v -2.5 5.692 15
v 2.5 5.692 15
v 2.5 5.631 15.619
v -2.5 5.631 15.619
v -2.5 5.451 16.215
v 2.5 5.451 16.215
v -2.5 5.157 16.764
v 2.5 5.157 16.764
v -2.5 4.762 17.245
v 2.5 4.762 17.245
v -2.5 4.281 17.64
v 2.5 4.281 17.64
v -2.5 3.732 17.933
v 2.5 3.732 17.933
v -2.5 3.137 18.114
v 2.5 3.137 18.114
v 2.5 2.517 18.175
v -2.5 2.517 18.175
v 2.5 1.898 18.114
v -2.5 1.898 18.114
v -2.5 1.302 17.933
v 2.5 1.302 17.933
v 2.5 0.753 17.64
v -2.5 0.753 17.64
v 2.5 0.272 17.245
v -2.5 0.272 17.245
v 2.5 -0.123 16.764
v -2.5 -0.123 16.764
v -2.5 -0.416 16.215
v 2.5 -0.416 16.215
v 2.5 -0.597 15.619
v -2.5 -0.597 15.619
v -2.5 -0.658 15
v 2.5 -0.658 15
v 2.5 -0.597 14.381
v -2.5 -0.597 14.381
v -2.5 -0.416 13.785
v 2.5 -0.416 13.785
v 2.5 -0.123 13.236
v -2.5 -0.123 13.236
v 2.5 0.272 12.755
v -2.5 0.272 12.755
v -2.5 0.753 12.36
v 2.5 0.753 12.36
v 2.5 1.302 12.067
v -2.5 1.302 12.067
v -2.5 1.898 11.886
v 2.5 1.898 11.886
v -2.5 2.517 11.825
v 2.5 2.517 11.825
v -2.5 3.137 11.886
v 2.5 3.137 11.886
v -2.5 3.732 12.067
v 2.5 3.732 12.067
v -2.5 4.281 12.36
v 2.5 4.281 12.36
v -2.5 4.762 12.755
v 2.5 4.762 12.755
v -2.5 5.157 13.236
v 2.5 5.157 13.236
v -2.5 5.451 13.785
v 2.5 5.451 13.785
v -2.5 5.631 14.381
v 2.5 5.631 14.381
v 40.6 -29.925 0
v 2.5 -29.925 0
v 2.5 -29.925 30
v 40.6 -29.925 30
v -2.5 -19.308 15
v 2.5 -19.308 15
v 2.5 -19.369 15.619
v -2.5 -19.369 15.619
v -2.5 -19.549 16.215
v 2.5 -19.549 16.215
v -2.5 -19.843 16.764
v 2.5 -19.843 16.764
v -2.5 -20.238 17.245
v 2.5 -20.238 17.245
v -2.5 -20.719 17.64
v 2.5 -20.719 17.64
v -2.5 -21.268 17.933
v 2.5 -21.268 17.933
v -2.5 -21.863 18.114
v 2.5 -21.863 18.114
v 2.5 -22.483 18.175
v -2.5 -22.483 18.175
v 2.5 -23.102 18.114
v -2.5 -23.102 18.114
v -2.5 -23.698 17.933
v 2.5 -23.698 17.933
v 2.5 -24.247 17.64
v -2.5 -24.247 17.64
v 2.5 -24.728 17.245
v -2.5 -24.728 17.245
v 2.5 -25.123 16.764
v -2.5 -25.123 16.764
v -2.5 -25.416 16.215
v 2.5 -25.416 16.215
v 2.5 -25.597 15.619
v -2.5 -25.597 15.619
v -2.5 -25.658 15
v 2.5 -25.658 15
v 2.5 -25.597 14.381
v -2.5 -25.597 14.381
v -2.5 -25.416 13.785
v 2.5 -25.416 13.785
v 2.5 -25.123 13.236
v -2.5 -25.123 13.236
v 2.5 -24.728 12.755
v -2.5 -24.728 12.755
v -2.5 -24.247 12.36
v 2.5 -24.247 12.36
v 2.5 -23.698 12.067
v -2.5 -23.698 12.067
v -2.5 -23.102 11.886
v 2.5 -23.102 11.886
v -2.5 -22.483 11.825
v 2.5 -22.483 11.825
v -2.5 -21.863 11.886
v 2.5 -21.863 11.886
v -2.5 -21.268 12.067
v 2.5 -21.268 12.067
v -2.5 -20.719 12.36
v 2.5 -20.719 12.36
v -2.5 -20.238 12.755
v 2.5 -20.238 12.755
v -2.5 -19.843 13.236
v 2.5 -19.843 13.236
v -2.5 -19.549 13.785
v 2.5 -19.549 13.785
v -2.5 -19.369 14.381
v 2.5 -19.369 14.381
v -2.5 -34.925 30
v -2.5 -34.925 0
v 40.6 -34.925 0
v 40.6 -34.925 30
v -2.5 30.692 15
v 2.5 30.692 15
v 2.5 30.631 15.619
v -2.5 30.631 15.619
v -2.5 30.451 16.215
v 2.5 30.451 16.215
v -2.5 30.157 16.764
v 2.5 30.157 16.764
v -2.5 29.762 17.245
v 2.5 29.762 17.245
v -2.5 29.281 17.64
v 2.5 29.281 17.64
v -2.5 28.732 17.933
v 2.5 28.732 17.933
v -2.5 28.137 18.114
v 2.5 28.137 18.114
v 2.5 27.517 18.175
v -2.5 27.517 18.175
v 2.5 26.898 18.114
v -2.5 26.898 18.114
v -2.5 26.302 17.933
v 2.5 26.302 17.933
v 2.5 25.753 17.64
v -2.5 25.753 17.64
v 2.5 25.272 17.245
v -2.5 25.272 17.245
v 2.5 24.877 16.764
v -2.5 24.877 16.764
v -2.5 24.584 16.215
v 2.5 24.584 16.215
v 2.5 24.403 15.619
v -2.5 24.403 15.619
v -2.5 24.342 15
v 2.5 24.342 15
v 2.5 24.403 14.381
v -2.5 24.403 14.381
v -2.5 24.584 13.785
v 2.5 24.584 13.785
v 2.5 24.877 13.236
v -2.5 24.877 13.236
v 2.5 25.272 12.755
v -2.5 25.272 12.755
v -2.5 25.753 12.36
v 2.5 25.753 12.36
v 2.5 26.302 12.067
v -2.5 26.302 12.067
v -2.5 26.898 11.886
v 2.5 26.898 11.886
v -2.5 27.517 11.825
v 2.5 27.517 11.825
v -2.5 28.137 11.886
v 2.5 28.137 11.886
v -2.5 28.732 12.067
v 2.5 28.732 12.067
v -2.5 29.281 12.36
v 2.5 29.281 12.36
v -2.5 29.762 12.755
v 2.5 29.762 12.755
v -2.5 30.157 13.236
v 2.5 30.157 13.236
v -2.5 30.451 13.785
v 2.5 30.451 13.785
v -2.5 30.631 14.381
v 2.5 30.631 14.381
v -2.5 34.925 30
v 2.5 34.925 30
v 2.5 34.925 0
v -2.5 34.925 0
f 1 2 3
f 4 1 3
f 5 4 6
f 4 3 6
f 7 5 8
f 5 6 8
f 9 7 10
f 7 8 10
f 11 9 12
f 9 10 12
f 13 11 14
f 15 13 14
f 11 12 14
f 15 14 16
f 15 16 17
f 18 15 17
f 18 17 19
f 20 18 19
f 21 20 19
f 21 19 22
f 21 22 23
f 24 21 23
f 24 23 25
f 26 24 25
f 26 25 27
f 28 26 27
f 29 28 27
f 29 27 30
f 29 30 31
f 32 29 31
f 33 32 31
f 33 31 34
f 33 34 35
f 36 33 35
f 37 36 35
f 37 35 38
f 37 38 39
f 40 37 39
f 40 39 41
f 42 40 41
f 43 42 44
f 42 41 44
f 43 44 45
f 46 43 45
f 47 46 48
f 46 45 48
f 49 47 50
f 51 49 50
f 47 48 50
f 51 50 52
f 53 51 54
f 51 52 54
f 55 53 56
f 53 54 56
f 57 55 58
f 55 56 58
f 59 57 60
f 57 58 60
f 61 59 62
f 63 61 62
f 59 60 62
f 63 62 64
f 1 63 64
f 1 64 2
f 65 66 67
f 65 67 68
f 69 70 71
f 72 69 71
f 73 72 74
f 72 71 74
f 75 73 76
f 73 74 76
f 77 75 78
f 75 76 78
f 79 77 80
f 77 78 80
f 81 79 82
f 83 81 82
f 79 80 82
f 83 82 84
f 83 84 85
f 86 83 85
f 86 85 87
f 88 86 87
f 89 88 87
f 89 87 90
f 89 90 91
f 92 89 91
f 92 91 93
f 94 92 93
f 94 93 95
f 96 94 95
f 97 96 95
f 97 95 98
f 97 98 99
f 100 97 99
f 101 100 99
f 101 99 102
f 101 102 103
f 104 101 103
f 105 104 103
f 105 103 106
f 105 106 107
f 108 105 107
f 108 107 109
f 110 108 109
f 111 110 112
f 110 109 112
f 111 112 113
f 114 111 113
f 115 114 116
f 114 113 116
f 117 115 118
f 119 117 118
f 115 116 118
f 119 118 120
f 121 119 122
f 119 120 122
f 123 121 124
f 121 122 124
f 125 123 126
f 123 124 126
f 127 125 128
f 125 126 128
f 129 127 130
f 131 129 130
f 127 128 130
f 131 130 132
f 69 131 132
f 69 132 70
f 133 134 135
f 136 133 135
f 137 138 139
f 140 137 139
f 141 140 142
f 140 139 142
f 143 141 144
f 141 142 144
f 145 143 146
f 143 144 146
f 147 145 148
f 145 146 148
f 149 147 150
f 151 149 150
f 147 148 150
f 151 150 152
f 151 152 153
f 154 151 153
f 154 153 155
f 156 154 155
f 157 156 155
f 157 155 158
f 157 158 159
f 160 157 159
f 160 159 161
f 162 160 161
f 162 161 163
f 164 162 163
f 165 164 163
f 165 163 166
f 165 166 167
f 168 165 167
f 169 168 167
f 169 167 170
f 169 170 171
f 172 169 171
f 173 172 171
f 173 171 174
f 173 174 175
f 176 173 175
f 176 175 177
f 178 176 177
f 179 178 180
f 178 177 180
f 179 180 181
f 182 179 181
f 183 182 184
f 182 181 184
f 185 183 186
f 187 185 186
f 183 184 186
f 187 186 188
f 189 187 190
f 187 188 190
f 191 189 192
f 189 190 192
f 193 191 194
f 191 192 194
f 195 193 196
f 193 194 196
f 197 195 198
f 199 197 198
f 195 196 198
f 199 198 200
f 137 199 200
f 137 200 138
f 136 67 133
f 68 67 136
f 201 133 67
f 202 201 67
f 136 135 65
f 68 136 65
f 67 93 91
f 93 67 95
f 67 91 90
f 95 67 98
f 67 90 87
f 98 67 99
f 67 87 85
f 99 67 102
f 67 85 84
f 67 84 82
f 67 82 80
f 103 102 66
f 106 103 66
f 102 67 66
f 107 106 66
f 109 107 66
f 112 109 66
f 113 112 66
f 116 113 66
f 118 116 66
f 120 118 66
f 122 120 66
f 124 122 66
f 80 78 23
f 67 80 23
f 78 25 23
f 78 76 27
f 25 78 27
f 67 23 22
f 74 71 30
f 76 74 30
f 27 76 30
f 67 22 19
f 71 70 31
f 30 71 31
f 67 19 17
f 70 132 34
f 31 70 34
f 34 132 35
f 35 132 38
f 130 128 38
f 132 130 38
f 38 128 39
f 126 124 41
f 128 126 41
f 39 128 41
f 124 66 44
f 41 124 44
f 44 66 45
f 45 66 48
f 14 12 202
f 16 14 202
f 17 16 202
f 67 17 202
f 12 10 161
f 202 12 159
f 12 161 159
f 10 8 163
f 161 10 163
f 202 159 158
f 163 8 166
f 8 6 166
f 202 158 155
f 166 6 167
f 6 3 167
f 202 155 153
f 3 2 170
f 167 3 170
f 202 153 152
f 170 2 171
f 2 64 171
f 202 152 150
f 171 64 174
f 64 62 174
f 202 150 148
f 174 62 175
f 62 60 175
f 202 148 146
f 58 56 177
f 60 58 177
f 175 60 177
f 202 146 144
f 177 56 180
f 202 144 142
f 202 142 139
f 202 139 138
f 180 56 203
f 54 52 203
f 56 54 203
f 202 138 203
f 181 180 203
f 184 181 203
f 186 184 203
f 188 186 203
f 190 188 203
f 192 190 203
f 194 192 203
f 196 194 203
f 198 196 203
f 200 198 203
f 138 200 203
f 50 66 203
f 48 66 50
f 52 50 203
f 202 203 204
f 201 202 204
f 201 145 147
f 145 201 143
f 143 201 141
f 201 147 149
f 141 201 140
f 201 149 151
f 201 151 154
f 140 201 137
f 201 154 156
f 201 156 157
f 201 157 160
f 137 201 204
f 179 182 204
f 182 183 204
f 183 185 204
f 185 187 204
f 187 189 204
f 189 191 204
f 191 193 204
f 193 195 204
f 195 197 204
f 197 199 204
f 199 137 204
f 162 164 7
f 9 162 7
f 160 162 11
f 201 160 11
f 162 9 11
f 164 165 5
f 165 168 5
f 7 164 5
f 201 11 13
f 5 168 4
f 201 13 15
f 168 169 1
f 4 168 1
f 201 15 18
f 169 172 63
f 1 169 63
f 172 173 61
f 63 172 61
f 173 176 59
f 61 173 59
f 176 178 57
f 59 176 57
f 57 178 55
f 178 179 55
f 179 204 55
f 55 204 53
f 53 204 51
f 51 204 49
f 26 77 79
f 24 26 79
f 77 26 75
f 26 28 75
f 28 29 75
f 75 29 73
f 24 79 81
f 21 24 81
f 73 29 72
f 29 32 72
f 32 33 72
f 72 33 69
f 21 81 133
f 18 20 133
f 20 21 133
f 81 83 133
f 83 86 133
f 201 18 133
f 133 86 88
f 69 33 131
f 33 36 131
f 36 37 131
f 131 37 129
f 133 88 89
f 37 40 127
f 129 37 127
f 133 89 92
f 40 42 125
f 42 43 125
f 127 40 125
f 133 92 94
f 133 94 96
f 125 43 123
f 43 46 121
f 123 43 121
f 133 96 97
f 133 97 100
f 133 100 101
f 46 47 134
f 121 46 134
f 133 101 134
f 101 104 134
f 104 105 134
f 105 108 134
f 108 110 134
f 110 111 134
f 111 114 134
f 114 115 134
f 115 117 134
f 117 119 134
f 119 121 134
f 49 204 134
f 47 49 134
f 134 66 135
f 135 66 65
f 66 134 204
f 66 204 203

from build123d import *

# Parameters (mm, degrees)
F0_W     = 38.1
F0_H     = 5
F1_DEPTH = 30
F2_R     = 3.175
F3_DEPTH = 25.4


with BuildPart() as f1:
    # F0 (on Top) → F1 (new body)
    with BuildSketch(Plane.XY):
        Polygon((-2.5, -34.925), (2.5, -34.925), (2.5, -29.925), (2.5, 34.925), (-2.5, 34.925), align=None)
        with Locations((21.55, -32.425)):
            Rectangle(F0_W, F0_H)
    extrude(amount=F1_DEPTH)

    # F2 (on face) → F3 (cut)
    with BuildSketch(Plane.YZ.offset(2.5)):
        with Locations((-22.4828, 15)):
            Circle(F2_R)
        with Locations((2.5172, 15)):
            Circle(F2_R)
        with Locations((27.5172, 15)):
            Circle(F2_R)
    extrude(amount=-F3_DEPTH, mode=Mode.SUBTRACT)


solid = f1.part
